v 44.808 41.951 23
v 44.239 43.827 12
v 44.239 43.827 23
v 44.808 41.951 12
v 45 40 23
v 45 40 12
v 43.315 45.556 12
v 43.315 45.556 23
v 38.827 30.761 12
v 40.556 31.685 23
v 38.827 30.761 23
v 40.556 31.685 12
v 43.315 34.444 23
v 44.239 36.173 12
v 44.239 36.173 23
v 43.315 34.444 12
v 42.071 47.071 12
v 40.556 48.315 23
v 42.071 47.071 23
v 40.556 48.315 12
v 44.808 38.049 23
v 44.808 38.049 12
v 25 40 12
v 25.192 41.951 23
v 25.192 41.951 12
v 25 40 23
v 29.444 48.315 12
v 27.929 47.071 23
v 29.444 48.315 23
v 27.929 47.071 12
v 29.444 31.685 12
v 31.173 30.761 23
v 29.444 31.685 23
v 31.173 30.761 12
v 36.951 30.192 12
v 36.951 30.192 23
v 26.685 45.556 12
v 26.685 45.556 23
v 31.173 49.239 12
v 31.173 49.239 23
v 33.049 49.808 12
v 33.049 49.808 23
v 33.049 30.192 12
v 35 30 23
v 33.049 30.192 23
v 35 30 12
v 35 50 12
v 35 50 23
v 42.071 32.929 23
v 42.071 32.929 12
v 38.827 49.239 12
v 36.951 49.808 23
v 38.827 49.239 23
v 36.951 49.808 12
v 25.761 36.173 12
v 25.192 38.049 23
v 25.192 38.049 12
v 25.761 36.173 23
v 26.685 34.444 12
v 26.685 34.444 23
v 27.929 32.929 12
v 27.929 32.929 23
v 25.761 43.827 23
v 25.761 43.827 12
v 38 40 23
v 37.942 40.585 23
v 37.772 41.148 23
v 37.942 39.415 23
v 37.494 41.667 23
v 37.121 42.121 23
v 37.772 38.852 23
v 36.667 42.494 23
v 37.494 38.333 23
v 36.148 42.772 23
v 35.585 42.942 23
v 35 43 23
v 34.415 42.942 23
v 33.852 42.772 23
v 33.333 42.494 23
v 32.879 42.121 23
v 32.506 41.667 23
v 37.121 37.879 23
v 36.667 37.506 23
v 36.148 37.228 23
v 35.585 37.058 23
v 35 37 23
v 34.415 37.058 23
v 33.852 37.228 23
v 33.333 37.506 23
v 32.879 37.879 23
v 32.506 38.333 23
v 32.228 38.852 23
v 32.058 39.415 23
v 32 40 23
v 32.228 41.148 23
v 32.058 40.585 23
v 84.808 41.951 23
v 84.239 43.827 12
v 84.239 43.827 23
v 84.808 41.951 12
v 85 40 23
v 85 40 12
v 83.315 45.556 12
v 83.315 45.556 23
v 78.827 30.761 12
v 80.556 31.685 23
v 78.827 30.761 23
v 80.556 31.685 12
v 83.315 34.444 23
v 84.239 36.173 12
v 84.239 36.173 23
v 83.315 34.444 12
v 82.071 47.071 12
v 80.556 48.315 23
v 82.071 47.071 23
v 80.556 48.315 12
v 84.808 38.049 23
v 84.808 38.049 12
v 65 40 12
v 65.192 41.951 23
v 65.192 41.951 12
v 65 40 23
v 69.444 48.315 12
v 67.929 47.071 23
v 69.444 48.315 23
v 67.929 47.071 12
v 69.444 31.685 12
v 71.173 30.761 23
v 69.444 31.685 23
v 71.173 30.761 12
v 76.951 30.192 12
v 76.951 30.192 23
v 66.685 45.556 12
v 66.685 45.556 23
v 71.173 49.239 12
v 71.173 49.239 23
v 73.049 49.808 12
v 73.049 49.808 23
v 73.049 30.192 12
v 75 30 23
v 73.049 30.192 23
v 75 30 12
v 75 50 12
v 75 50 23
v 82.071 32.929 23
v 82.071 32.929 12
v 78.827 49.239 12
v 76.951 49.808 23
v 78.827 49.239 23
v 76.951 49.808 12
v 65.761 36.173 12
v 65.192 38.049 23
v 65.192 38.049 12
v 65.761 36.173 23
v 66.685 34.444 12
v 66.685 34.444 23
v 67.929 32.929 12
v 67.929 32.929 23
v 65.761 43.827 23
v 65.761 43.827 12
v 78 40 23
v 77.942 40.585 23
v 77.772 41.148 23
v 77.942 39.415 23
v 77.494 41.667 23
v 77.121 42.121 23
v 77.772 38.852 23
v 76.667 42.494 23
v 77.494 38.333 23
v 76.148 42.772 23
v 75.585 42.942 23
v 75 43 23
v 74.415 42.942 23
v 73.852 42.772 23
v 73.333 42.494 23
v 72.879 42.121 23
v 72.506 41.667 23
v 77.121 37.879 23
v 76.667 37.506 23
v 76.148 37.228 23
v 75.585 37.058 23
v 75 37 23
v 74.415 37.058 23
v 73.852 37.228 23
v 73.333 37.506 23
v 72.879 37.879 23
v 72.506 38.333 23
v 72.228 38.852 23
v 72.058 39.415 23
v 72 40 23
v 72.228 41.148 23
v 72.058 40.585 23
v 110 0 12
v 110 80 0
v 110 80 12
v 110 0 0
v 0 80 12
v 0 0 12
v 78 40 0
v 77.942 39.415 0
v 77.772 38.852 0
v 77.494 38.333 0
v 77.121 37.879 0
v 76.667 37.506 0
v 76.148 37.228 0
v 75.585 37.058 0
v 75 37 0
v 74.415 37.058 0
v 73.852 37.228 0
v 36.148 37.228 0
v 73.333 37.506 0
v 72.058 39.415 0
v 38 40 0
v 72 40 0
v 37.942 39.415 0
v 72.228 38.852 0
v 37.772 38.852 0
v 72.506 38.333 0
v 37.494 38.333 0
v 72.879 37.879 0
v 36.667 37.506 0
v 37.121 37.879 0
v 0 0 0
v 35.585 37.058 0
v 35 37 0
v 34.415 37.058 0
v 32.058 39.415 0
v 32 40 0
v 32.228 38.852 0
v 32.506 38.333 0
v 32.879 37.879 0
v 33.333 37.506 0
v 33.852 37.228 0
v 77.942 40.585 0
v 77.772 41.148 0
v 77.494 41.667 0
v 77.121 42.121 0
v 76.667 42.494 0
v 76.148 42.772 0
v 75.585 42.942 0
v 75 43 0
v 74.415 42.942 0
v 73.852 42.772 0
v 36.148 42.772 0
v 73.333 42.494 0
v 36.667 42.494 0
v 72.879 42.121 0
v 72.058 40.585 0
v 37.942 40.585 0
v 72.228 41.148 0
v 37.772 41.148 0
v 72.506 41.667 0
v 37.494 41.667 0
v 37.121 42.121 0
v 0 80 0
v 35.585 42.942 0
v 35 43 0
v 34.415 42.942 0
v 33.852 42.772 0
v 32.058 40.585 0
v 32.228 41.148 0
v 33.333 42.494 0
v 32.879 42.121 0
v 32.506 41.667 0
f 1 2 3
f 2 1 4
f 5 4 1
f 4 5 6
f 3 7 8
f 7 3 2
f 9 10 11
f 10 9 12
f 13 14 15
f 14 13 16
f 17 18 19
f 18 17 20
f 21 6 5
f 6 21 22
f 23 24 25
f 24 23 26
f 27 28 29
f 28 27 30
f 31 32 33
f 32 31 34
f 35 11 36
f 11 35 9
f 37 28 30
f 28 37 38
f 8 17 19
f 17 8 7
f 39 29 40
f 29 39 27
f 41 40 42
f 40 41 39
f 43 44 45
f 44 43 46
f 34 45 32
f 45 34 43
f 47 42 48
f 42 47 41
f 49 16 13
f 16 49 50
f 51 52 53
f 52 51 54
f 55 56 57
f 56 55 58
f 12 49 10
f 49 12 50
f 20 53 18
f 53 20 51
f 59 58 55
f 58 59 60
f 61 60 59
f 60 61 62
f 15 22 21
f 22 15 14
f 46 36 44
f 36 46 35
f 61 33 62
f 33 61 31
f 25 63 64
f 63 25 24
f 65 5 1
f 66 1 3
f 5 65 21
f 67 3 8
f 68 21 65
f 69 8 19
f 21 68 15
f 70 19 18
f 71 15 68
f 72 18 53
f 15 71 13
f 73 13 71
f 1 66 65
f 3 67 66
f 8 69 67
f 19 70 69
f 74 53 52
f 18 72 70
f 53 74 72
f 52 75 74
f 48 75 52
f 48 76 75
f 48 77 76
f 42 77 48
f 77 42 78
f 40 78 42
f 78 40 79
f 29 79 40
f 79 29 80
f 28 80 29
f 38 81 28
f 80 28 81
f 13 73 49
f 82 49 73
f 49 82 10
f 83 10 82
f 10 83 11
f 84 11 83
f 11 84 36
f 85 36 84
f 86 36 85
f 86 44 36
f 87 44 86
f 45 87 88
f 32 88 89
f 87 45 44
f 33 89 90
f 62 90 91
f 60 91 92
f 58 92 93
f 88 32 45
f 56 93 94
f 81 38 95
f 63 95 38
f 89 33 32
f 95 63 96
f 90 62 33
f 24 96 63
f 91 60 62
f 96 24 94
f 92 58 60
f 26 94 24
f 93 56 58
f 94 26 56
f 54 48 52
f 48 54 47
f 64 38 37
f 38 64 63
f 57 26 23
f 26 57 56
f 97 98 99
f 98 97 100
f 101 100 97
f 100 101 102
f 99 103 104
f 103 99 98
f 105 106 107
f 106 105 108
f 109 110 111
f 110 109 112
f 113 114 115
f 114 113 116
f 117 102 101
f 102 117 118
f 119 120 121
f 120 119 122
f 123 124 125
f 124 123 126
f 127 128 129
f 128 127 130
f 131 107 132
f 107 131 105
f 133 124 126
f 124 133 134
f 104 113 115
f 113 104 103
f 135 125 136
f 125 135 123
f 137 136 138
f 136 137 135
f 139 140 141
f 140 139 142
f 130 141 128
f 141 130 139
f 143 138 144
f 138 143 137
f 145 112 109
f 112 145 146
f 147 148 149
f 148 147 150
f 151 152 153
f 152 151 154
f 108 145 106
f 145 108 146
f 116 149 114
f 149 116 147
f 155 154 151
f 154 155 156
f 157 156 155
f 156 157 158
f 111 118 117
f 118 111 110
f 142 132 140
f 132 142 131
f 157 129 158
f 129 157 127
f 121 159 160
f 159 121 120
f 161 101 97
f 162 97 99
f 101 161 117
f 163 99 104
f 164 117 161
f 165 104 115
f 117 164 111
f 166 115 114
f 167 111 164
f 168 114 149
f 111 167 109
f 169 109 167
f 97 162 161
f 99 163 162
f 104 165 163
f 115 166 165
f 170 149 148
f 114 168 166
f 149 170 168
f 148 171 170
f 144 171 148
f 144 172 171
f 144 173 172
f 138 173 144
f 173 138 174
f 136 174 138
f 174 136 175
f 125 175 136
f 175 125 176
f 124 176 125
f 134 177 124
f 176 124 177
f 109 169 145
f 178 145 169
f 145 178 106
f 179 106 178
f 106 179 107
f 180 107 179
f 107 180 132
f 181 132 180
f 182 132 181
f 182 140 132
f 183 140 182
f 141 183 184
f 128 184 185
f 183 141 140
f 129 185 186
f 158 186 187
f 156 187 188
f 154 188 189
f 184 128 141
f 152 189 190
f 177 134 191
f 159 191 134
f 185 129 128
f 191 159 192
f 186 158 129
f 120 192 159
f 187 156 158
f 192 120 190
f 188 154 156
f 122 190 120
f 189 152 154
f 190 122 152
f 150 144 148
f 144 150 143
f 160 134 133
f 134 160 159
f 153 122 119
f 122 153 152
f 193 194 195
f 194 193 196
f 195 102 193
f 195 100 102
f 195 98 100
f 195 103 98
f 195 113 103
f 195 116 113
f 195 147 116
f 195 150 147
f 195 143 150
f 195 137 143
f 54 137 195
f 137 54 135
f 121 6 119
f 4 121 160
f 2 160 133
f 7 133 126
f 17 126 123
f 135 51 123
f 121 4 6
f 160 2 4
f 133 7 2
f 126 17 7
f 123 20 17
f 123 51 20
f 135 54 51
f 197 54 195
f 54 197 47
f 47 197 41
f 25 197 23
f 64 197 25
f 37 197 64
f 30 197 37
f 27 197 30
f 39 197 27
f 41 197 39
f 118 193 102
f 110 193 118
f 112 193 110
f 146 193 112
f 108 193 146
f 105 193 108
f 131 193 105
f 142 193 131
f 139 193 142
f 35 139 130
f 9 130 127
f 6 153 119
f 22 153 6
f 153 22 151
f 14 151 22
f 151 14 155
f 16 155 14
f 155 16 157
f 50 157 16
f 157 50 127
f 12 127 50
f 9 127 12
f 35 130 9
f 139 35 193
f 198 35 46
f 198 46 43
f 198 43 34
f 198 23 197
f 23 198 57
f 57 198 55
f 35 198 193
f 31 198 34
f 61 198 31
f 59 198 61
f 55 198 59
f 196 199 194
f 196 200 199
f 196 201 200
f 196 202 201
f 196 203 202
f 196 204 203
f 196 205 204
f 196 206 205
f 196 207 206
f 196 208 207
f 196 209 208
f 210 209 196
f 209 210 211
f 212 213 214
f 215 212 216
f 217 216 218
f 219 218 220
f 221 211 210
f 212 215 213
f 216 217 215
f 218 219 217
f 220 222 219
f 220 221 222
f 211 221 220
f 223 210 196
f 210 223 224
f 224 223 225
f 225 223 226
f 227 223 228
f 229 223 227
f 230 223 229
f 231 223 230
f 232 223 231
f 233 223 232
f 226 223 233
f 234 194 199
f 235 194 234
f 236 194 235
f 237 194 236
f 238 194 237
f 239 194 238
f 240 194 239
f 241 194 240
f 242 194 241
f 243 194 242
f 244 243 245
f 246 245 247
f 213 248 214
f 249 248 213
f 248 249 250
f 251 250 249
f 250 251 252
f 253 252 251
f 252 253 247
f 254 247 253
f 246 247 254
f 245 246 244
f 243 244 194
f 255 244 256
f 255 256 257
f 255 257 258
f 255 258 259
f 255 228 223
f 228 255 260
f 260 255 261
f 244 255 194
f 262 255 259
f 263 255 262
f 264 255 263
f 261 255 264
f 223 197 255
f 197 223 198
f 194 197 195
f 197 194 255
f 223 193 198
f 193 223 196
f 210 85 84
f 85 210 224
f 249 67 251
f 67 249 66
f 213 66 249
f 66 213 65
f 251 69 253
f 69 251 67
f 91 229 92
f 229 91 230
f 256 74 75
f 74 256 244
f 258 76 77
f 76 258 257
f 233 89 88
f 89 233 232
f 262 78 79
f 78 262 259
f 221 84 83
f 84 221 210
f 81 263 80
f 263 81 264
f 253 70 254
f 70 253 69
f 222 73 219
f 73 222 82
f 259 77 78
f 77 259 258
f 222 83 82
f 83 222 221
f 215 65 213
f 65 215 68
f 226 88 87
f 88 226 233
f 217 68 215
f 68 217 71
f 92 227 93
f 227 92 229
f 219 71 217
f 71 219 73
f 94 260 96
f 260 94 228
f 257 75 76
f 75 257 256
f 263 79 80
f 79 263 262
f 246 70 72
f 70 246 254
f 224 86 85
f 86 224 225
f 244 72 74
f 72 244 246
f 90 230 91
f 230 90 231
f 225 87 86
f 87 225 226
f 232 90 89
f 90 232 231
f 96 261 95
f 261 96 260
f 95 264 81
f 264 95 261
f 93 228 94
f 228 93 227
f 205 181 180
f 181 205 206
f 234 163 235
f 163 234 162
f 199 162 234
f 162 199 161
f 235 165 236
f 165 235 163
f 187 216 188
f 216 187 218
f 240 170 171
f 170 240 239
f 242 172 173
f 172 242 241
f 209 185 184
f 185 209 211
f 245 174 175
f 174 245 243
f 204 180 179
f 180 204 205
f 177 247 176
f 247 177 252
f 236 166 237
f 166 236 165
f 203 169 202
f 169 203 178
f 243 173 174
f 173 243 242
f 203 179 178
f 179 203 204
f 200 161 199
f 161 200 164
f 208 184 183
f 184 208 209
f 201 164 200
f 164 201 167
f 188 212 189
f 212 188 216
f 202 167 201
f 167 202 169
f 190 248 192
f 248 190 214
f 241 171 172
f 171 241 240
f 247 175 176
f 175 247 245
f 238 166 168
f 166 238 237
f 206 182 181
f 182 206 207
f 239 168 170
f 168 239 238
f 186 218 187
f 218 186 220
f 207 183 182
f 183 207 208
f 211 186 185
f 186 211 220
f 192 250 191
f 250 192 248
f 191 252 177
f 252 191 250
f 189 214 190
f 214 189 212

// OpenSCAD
$fn = 32;

// ----------------------------------------------------------------------
// Drill jig: two_boss jig
// ----------------------------------------------------------------------

// --- parameters (mm) ---
plate_l = 110;            // plate length, X
plate_w = 80;             // plate width, Y
plate_t = 12;             // plate thickness
boss_d = 20;              // guide boss diameter
boss_h = 12;              // boss height above the plate
guide_d = 6;              // guide hole diameter
boss_pitch = 40;          // boss pitch

n_boss = 2;  // guide bosses
boss_x0 = (plate_l - (n_boss - 1) * boss_pitch) / 2;  // first boss X
boss_top = plate_t - 1 + boss_h;  // boss crown height
total_h = boss_top;  // overall height

difference() {
  union() {
  cube([plate_l, plate_w, plate_t]);
  for (i = [0 : n_boss - 1])
    translate([boss_x0 + i * boss_pitch, plate_w / 2, plate_t - 1])
      cylinder(h = boss_h, d = boss_d);
  }
  for (i = [0 : n_boss - 1])
    translate([boss_x0 + i * boss_pitch, plate_w / 2, -1])
      cylinder(h = plate_t + boss_h, d = guide_d);
}
